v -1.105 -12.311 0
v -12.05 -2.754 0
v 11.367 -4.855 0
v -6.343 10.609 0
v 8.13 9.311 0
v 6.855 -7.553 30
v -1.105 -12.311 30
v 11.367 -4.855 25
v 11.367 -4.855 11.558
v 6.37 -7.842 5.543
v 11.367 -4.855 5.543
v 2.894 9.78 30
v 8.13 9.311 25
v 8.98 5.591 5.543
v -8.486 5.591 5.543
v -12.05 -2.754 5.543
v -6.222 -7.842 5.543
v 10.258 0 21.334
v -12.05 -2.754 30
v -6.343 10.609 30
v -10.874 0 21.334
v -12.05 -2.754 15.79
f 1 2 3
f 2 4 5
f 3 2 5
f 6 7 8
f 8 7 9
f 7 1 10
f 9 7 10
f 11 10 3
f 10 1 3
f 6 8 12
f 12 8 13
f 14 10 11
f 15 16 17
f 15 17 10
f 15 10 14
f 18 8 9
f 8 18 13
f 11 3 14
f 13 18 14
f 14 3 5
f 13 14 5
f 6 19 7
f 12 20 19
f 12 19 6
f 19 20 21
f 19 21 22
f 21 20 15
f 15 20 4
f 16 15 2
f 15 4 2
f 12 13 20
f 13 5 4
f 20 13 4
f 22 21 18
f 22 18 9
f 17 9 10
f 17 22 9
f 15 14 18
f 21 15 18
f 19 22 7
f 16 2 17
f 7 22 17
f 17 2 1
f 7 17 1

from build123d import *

# Parameters (mm, degrees)
F1_DEPTH      = 30
F3_DEPTH      = 12.0510542326
F3_DEPTH_BACK = 11.3682544958
F4_SIZE       = 5


with BuildPart() as f1:
    # F0 (on Top) → F1 (new body)
    with BuildSketch(Plane.XY):
        Polygon((-1.1047931817, -12.3112077606), (11.3672544958, -4.8550931739), (8.1301428189, 9.3105951606), (-6.3425499004, 10.6093574387), (-12.0500542326, -2.7536516647), align=None)
    extrude(amount=F1_DEPTH)

    # F2 (on Right) → F3 (cut, two sides)
    with BuildSketch(Plane.YZ) as f3_sk:
        Polygon((0, 21.3343687356), (-7.8424783424, 5.5425534956), (5.5912830867, 5.5425534956), align=None)
    extrude(amount=-F3_DEPTH, mode=Mode.SUBTRACT)
    extrude(f3_sk.sketch, amount=F3_DEPTH_BACK, mode=Mode.SUBTRACT)

    # F4
    f4_edges = [f1.edges().sort_by_distance(p)[0] for p in [
        (9.748699, 2.227751, 30),
    ]]
    chamfer(f4_edges, length=F4_SIZE)


solid = f1.part
